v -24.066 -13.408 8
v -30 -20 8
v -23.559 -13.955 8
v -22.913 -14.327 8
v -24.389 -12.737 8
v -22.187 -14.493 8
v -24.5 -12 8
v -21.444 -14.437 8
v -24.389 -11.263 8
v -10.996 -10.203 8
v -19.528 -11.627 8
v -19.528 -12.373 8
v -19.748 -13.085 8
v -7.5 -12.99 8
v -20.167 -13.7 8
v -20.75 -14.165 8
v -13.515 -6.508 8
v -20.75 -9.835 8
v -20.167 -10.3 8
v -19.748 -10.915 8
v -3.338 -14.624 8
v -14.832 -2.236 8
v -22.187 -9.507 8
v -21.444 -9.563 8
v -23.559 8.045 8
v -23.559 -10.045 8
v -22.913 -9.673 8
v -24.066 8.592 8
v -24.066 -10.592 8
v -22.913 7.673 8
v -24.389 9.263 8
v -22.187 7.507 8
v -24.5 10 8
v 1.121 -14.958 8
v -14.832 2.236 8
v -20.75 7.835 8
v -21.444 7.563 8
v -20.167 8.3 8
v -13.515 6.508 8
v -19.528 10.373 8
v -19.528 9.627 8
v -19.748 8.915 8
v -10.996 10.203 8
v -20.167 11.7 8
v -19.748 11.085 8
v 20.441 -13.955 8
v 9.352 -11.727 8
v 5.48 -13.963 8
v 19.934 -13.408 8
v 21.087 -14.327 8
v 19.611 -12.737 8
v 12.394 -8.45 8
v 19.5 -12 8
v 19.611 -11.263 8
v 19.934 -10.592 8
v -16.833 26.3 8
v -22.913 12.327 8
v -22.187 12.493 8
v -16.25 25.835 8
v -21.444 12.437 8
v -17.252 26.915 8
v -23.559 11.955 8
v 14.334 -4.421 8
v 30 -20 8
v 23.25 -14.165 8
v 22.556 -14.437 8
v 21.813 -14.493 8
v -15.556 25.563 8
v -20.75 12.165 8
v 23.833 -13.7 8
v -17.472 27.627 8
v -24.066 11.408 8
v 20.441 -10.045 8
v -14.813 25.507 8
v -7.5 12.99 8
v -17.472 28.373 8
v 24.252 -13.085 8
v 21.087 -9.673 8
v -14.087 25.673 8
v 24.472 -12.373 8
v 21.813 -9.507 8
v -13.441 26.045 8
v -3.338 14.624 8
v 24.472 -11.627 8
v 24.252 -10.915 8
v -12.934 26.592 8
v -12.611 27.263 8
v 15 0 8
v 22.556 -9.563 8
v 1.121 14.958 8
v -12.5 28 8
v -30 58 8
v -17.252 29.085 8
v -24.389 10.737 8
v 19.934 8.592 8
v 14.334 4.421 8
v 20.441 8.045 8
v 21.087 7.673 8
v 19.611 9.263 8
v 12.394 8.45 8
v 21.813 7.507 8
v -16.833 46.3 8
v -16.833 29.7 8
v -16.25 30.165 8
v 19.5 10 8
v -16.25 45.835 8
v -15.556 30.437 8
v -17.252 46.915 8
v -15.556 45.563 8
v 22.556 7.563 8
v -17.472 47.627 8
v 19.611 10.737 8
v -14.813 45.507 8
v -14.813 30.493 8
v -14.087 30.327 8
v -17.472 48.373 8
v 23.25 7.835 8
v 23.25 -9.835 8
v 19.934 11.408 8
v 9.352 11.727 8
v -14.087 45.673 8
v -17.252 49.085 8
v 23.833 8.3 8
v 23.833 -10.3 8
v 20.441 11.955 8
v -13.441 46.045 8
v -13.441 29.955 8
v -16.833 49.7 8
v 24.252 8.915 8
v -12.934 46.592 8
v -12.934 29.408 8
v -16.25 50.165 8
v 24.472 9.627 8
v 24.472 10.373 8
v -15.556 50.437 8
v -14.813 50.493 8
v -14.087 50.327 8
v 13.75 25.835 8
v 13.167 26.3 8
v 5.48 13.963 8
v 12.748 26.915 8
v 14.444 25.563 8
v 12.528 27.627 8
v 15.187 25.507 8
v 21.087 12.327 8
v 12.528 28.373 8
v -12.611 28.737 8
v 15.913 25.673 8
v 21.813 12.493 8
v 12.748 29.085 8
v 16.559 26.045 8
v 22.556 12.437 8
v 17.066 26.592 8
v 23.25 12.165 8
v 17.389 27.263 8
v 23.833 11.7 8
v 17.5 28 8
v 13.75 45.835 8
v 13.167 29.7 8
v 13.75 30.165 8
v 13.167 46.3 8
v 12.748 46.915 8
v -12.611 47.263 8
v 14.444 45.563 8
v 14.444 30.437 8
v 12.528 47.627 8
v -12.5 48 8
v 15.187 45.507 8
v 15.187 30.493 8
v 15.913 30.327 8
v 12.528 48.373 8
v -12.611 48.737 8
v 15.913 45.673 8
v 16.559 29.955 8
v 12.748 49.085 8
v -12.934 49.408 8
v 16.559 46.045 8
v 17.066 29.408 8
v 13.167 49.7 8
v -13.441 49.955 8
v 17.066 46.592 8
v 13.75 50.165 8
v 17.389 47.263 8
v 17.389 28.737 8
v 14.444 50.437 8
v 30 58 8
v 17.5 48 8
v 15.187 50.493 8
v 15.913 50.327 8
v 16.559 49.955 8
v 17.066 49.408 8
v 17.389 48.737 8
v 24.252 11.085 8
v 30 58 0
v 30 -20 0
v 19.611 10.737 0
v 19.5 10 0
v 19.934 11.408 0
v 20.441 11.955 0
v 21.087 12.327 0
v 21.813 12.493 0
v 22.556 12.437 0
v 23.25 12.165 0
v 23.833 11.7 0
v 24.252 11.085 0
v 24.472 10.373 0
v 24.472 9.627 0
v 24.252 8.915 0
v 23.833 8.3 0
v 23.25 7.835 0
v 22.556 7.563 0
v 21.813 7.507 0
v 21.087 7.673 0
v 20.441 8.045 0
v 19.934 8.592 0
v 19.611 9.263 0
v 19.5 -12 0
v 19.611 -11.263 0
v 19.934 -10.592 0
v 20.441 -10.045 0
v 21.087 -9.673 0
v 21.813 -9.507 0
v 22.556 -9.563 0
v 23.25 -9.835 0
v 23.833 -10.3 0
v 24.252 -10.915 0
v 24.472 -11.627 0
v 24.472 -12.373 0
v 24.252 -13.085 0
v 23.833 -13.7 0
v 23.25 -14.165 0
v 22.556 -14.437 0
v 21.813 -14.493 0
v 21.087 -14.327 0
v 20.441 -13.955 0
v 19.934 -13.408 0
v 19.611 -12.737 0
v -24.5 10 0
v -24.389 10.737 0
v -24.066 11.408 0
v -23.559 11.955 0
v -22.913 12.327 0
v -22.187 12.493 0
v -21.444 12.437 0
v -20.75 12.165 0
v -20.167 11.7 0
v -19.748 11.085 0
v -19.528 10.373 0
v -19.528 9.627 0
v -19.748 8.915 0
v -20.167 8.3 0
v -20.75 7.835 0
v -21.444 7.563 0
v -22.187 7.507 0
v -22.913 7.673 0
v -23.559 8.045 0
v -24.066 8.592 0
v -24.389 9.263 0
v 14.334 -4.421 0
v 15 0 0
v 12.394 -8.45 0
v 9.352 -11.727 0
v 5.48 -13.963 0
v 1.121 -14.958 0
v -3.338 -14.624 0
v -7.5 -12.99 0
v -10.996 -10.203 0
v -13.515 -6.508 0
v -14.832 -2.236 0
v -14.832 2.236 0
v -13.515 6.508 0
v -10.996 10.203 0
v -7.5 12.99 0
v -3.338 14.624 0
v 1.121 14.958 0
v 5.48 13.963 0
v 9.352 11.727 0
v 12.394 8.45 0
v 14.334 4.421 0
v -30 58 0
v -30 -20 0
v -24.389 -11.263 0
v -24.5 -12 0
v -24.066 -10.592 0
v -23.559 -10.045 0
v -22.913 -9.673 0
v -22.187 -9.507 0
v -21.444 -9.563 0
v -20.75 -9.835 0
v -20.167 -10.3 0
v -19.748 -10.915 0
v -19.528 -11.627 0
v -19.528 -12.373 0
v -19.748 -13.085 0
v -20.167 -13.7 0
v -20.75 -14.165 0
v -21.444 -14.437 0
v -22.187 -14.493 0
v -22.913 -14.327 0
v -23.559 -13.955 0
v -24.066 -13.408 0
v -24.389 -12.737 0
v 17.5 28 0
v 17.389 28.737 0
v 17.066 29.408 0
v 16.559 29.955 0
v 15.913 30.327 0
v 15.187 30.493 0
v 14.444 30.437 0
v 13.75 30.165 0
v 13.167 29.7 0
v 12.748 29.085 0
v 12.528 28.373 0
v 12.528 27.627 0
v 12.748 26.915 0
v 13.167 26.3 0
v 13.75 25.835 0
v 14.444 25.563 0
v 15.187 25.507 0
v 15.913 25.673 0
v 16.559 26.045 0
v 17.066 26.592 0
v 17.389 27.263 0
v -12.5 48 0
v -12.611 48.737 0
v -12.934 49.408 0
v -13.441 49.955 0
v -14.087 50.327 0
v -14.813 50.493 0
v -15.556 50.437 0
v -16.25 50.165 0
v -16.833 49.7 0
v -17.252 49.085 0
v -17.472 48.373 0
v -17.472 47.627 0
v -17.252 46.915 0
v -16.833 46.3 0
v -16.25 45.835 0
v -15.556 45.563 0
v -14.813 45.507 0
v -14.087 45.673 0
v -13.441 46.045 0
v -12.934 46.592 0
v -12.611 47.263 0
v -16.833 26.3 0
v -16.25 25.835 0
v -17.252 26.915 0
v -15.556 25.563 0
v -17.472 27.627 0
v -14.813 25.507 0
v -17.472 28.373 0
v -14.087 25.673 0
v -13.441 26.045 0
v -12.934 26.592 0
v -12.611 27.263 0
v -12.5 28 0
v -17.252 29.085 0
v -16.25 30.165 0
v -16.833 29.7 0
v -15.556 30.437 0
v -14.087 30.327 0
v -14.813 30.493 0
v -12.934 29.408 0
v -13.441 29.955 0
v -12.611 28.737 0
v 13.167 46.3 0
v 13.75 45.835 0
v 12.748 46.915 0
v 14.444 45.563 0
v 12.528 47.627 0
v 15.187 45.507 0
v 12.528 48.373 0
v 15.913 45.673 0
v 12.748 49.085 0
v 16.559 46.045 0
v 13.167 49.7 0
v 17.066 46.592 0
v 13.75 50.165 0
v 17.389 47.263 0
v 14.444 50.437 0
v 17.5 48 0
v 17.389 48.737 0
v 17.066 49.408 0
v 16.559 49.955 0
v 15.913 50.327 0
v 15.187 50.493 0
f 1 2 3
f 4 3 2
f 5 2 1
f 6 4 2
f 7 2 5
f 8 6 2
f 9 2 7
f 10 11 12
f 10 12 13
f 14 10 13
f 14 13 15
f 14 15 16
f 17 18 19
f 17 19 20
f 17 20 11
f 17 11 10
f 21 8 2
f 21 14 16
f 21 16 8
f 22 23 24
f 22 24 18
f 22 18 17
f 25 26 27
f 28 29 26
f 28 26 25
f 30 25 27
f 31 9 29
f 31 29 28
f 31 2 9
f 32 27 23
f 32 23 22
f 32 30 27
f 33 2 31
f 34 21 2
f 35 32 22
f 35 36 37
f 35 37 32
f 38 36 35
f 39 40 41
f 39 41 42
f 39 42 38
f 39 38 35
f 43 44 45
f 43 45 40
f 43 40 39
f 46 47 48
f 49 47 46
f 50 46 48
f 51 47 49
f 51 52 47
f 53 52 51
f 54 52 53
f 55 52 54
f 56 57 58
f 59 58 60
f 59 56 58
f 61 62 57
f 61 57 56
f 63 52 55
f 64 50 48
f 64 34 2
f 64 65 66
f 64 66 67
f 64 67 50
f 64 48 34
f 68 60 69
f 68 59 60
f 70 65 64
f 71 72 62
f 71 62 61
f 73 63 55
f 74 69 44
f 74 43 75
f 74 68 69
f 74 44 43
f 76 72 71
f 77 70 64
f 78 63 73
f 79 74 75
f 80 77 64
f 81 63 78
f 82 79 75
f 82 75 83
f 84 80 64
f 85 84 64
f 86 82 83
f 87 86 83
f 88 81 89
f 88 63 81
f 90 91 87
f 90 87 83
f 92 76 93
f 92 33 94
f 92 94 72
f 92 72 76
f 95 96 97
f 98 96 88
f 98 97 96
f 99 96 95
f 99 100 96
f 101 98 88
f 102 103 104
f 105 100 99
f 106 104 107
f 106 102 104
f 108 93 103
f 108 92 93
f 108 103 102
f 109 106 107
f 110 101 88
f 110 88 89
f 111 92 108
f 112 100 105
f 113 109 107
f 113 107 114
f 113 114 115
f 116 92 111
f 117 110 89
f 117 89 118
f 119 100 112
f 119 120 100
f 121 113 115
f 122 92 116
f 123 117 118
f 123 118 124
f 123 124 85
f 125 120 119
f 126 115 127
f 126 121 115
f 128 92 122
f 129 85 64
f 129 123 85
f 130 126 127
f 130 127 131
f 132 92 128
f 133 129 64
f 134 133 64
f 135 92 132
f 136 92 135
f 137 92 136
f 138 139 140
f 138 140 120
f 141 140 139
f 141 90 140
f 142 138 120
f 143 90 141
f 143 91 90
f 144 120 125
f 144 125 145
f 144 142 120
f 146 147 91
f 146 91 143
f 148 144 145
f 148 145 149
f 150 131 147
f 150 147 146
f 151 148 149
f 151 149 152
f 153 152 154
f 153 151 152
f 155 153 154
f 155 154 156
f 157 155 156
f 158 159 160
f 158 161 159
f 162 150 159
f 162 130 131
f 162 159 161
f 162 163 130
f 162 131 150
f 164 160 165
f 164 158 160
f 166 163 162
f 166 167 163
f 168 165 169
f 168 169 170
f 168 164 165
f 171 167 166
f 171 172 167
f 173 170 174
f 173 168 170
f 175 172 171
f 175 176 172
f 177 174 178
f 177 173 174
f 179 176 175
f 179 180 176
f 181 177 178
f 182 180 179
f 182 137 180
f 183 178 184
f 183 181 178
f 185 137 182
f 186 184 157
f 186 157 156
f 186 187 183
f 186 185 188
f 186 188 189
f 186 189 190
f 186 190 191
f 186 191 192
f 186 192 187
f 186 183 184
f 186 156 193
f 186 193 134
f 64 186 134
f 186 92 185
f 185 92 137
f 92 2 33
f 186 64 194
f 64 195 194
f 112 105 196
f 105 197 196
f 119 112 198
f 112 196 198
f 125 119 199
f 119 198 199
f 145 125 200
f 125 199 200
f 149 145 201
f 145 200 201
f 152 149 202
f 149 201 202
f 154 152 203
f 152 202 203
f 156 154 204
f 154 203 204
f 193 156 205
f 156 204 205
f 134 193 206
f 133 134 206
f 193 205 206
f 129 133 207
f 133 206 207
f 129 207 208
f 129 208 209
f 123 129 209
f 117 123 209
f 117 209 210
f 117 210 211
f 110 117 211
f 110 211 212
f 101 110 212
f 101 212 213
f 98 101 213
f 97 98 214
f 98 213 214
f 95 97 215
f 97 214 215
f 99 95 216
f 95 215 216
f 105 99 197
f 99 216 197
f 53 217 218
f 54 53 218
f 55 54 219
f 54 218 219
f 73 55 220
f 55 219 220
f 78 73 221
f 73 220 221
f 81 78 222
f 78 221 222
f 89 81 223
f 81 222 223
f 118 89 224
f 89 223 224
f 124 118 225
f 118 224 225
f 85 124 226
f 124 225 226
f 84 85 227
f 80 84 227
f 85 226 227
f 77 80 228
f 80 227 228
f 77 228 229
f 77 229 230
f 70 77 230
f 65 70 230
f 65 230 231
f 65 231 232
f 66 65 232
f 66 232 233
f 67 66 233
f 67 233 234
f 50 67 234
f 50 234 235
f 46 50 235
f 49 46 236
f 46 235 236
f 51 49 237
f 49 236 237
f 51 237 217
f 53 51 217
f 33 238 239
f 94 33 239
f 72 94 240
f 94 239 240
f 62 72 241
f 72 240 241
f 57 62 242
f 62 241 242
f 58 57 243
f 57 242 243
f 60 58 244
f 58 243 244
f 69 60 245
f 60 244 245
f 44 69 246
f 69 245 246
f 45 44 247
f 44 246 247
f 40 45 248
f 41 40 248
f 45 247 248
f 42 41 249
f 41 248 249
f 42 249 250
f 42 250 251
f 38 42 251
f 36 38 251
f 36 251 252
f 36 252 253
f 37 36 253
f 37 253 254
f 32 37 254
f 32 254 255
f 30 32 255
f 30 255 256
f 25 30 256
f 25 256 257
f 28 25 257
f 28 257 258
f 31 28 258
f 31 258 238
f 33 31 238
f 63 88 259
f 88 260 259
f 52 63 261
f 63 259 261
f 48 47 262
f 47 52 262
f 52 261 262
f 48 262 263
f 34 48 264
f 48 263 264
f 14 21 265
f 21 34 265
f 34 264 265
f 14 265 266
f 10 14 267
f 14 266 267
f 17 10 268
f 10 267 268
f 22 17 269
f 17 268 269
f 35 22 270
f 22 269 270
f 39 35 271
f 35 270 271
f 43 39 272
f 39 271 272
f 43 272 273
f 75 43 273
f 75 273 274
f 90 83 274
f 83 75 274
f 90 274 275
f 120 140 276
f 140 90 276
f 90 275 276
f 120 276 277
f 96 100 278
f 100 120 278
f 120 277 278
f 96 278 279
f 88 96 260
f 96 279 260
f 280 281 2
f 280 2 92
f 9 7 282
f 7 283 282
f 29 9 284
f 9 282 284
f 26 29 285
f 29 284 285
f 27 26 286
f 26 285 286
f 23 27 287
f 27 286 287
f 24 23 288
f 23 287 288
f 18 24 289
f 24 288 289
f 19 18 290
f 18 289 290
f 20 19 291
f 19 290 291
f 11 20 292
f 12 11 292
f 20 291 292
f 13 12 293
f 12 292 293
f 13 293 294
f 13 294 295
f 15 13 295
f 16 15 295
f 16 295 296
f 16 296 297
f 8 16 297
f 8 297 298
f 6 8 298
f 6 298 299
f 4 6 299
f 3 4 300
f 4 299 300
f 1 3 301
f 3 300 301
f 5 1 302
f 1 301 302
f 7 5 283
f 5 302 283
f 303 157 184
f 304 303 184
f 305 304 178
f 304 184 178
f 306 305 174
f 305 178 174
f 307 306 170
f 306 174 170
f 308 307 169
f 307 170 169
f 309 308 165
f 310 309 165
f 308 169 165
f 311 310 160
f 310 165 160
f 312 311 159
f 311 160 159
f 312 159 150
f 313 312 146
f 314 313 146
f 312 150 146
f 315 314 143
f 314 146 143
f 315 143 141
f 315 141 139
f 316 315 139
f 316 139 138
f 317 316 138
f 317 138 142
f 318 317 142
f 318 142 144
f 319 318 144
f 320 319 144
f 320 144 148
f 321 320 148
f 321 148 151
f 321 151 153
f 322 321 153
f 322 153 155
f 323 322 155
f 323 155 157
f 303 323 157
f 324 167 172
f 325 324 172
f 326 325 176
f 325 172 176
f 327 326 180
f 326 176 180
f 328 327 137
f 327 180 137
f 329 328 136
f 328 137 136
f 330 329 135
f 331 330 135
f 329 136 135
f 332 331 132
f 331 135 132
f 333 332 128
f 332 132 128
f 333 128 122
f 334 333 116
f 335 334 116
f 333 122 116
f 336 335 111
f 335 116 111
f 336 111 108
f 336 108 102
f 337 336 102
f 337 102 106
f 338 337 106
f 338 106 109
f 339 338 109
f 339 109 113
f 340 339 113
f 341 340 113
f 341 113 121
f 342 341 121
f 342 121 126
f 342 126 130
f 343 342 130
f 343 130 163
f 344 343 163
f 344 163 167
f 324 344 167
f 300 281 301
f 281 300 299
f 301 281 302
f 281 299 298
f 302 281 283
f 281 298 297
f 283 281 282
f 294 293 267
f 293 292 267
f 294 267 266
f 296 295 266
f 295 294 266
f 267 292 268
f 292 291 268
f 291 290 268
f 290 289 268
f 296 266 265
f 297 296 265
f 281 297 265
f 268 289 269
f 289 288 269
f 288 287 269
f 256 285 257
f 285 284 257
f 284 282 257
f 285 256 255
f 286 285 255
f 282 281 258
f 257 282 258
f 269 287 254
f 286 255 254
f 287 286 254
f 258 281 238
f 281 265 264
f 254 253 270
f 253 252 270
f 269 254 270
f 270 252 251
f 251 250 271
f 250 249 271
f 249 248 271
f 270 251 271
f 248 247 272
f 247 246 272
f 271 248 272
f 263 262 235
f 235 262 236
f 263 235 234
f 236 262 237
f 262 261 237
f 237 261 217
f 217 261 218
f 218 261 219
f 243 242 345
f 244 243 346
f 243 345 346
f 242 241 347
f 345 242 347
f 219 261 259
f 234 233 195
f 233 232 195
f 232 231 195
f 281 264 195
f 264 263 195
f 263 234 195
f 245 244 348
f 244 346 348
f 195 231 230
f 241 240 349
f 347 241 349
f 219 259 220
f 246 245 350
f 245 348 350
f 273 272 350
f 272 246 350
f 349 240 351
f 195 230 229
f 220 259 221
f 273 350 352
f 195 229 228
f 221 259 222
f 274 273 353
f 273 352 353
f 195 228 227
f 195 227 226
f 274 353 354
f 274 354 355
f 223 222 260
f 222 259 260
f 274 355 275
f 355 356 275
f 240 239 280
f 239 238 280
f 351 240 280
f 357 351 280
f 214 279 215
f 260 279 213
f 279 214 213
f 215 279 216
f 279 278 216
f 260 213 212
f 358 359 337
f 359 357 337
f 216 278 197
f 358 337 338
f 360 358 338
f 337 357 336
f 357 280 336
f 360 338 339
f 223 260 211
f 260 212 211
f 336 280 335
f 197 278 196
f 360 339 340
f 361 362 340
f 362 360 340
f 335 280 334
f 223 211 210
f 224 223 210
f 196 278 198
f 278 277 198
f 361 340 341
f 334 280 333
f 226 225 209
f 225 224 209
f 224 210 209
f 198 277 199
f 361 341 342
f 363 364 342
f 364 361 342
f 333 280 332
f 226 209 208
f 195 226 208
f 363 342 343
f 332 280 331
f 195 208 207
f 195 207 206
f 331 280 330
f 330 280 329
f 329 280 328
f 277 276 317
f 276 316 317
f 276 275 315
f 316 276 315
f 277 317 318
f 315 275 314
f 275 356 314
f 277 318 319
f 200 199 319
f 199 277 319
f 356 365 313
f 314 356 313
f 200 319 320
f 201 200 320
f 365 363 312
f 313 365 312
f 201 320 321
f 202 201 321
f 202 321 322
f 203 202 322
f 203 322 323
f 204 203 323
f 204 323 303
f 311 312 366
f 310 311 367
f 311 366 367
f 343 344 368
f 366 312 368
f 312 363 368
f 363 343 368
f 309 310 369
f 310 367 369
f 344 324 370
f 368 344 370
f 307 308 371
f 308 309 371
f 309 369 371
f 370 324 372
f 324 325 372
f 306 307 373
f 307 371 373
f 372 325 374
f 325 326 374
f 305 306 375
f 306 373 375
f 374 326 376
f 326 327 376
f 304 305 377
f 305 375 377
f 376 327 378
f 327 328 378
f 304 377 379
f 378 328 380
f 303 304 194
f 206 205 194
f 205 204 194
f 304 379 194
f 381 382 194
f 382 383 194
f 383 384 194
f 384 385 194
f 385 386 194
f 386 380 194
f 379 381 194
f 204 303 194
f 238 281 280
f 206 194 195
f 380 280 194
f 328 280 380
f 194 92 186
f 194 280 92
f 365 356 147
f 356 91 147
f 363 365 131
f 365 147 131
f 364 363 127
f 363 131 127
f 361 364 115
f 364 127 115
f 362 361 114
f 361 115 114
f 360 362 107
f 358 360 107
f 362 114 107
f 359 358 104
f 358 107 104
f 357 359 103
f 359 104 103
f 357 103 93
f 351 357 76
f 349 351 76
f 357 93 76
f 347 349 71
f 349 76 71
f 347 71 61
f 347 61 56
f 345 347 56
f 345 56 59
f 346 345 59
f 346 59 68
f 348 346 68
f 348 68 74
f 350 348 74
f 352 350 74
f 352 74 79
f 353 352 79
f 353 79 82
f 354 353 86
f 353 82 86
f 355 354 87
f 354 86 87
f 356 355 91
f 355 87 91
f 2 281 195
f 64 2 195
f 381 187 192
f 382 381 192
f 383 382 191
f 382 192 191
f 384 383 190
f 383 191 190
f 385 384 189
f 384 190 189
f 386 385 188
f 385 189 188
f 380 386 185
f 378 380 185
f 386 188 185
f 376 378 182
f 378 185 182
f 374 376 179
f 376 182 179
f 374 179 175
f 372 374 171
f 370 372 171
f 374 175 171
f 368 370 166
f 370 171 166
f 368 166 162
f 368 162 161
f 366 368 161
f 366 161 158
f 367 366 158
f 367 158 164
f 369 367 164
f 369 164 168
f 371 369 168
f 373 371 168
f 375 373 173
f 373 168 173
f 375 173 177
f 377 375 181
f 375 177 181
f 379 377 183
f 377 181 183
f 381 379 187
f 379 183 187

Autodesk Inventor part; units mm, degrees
ref_plane "YZ Plane" through (0, 0, 0) normal (1, 0, 0) x (0, 1, 0)
ref_plane "XZ Plane" through (0, 0, 0) normal (0, 1, 0) x (-1, 0, 0)
ref_plane "XY Plane" through (0, 0, 0) normal (0, 0, 1) x (1, 0, 0)
sketch "Szkic1" plane through (0, 0, 0) normal (0, 0, 1) x (1, 0, 0)
  line L0 (-30, 58) -> (30, 58)
  circle A0 centre (0, 0) radius 15
  line L1 (0, 0) -> (30, 0)
  line L2 (30, 0) -> (30, 58)
  line L3 (-30, 0) -> (-30, 58)
  line L4 (-30, 0) -> (-30, -20)
  line L5 (-30, -20) -> (30, -20)
  line L6 (30, -20) -> (30, 0)
  dimension "d2" = 30
  dimension "d7" = 78
  dimension "d8" = 60
  dimension "d9" = 20
extrude "Wyciągnięcie proste1" add sketch "Szkic1" along normal blind 8
sketch "Szkic2" plane through (0, 0, 8) normal (0, 0, 1) x (1, 0, 0)
  line L0 (30, 58) -> (-30, 58) projected
  line L1 (-30, 58) -> (-30, 18)
  line L2 (-30, 58) -> (-30, -20) projected
  line L3 (-30, 18) -> (30, 18)
  line L4 (30, -20) -> (30, 58) projected
  line L5 (30, 18) -> (30, 58)
  line L6 (-30, 58) -> (-30, 48)
  line L7 (-30, 18) -> (-30, 28)
  line L8 (-30, 28) -> (30, 28)
  line L9 (-30, 48) -> (30, 48)
  line L10 (-30, 48) -> (-15, 48)
  line L11 (-15, 48) -> (-15, 28)
  line L12 (30, 48) -> (15, 48)
  line L13 (15, 48) -> (15, 28)
  circle A0 centre (-15, 48) radius 2.5
  circle A1 centre (15, 48) radius 2.5
  circle A2 centre (-15, 28) radius 2.5
  circle A3 centre (15, 28) radius 2.5
  point P0 (0, 0)
  dimension "d12" = 40
  dimension "d13" = 90
  dimension "d14" = 10
  dimension "d15" = 10
  dimension "d16" = 15
  dimension "d17" = 15
  dimension "d18" = 5
  dimension "d19" = 5
  dimension "d20" = 5
  dimension "d21" = 5
extrude "Wyciągnięcie proste2" cut sketch "Szkic2" against normal up to next contours A1 L13 L9 | L9 A1 | A0 L9 | L9 L11 A0 | A3 L8 | L8 L13 A3 | L13 A1 L9 | A2 L11 L8 | L8 A2 | L9 A0 L11 | L8 A3 L13 | L11 A2 L8
sketch "Szkic3" plane through (0, 0, 0) normal (0, 0, -1) x (-1, 0, 0)
  circle A0 centre (0, 0) radius 15
  line L0 (-30, -20) -> (30, -20)
  line L1 (30, -20) -> (30, 18)
  line L2 (30, 18) -> (-30, 18)
  line L3 (-30, 18) -> (-30, -20)
  line L4 (-30, 18) -> (-30, -20)
  line L5 (-30, 18) -> (-22, 18)
  line L6 (30, 18) -> (-30, 18)
  line L7 (-22, 18) -> (-22, -20)
  line L8 (30, 18) -> (22, 18)
  line L9 (22, 18) -> (22, -20)
  line L10 (-22, 18) -> (-22, 10)
  line L11 (-22, -20) -> (-22, -12)
  line L12 (22, 18) -> (22, 10)
  line L13 (22, -20) -> (22, -12)
  circle A1 centre (-22, 10) radius 2.5
  circle A2 centre (-22, -12) radius 2.5
  circle A3 centre (22, 10) radius 2.5
  circle A4 centre (22, -12) radius 2.5
  circle A5 centre (-15, 28) radius 2.5 projected
  circle A6 centre (-15, 48) radius 2.5 projected
  circle A7 centre (15, 48) radius 2.5 projected
  circle A8 centre (15, 28) radius 2.5 projected
  circle A9 centre (0, 0) radius 15 projected
  line L14 (30, 58) -> (-30, 58) projected
  line L15 (-30, 58) -> (-30, -20) projected
  line L16 (-30, -20) -> (30, -20) projected
  line L17 (30, -20) -> (30, 58) projected
  point P0 (0, -1)
  dimension "d24" = 8
  dimension "d25" = 8
  dimension "d26" = 8
  dimension "d27" = 8
  dimension "d28" = 8
  dimension "d29" = 8
  dimension "d30" = 5
  dimension "d31" = 5
  dimension "d32" = 5
  dimension "d33" = 5
extrude "Wyciągnięcie proste3" cut sketch "Szkic3" against normal up to next contours A2 L7 | L7 A2 | A4 L9 | L9 A4 | A1 L7 | L7 A1 | A3 L9 | L9 A3
thread "Gwint1" size "M5x0.8" class "6H" standard "ANSI Metric M Profile" full length
thread "Gwint2" size "M5x0.8" class "6H" standard "ANSI Metric M Profile" full length
thread "Gwint3" size "M5x0.8" class "6H" standard "ANSI Metric M Profile" full length
thread "Gwint4" size "M5x0.8" class "6H" standard "ANSI Metric M Profile" full length
properties part number "Uchwyt silnika krokowego osi Y - płaski"
